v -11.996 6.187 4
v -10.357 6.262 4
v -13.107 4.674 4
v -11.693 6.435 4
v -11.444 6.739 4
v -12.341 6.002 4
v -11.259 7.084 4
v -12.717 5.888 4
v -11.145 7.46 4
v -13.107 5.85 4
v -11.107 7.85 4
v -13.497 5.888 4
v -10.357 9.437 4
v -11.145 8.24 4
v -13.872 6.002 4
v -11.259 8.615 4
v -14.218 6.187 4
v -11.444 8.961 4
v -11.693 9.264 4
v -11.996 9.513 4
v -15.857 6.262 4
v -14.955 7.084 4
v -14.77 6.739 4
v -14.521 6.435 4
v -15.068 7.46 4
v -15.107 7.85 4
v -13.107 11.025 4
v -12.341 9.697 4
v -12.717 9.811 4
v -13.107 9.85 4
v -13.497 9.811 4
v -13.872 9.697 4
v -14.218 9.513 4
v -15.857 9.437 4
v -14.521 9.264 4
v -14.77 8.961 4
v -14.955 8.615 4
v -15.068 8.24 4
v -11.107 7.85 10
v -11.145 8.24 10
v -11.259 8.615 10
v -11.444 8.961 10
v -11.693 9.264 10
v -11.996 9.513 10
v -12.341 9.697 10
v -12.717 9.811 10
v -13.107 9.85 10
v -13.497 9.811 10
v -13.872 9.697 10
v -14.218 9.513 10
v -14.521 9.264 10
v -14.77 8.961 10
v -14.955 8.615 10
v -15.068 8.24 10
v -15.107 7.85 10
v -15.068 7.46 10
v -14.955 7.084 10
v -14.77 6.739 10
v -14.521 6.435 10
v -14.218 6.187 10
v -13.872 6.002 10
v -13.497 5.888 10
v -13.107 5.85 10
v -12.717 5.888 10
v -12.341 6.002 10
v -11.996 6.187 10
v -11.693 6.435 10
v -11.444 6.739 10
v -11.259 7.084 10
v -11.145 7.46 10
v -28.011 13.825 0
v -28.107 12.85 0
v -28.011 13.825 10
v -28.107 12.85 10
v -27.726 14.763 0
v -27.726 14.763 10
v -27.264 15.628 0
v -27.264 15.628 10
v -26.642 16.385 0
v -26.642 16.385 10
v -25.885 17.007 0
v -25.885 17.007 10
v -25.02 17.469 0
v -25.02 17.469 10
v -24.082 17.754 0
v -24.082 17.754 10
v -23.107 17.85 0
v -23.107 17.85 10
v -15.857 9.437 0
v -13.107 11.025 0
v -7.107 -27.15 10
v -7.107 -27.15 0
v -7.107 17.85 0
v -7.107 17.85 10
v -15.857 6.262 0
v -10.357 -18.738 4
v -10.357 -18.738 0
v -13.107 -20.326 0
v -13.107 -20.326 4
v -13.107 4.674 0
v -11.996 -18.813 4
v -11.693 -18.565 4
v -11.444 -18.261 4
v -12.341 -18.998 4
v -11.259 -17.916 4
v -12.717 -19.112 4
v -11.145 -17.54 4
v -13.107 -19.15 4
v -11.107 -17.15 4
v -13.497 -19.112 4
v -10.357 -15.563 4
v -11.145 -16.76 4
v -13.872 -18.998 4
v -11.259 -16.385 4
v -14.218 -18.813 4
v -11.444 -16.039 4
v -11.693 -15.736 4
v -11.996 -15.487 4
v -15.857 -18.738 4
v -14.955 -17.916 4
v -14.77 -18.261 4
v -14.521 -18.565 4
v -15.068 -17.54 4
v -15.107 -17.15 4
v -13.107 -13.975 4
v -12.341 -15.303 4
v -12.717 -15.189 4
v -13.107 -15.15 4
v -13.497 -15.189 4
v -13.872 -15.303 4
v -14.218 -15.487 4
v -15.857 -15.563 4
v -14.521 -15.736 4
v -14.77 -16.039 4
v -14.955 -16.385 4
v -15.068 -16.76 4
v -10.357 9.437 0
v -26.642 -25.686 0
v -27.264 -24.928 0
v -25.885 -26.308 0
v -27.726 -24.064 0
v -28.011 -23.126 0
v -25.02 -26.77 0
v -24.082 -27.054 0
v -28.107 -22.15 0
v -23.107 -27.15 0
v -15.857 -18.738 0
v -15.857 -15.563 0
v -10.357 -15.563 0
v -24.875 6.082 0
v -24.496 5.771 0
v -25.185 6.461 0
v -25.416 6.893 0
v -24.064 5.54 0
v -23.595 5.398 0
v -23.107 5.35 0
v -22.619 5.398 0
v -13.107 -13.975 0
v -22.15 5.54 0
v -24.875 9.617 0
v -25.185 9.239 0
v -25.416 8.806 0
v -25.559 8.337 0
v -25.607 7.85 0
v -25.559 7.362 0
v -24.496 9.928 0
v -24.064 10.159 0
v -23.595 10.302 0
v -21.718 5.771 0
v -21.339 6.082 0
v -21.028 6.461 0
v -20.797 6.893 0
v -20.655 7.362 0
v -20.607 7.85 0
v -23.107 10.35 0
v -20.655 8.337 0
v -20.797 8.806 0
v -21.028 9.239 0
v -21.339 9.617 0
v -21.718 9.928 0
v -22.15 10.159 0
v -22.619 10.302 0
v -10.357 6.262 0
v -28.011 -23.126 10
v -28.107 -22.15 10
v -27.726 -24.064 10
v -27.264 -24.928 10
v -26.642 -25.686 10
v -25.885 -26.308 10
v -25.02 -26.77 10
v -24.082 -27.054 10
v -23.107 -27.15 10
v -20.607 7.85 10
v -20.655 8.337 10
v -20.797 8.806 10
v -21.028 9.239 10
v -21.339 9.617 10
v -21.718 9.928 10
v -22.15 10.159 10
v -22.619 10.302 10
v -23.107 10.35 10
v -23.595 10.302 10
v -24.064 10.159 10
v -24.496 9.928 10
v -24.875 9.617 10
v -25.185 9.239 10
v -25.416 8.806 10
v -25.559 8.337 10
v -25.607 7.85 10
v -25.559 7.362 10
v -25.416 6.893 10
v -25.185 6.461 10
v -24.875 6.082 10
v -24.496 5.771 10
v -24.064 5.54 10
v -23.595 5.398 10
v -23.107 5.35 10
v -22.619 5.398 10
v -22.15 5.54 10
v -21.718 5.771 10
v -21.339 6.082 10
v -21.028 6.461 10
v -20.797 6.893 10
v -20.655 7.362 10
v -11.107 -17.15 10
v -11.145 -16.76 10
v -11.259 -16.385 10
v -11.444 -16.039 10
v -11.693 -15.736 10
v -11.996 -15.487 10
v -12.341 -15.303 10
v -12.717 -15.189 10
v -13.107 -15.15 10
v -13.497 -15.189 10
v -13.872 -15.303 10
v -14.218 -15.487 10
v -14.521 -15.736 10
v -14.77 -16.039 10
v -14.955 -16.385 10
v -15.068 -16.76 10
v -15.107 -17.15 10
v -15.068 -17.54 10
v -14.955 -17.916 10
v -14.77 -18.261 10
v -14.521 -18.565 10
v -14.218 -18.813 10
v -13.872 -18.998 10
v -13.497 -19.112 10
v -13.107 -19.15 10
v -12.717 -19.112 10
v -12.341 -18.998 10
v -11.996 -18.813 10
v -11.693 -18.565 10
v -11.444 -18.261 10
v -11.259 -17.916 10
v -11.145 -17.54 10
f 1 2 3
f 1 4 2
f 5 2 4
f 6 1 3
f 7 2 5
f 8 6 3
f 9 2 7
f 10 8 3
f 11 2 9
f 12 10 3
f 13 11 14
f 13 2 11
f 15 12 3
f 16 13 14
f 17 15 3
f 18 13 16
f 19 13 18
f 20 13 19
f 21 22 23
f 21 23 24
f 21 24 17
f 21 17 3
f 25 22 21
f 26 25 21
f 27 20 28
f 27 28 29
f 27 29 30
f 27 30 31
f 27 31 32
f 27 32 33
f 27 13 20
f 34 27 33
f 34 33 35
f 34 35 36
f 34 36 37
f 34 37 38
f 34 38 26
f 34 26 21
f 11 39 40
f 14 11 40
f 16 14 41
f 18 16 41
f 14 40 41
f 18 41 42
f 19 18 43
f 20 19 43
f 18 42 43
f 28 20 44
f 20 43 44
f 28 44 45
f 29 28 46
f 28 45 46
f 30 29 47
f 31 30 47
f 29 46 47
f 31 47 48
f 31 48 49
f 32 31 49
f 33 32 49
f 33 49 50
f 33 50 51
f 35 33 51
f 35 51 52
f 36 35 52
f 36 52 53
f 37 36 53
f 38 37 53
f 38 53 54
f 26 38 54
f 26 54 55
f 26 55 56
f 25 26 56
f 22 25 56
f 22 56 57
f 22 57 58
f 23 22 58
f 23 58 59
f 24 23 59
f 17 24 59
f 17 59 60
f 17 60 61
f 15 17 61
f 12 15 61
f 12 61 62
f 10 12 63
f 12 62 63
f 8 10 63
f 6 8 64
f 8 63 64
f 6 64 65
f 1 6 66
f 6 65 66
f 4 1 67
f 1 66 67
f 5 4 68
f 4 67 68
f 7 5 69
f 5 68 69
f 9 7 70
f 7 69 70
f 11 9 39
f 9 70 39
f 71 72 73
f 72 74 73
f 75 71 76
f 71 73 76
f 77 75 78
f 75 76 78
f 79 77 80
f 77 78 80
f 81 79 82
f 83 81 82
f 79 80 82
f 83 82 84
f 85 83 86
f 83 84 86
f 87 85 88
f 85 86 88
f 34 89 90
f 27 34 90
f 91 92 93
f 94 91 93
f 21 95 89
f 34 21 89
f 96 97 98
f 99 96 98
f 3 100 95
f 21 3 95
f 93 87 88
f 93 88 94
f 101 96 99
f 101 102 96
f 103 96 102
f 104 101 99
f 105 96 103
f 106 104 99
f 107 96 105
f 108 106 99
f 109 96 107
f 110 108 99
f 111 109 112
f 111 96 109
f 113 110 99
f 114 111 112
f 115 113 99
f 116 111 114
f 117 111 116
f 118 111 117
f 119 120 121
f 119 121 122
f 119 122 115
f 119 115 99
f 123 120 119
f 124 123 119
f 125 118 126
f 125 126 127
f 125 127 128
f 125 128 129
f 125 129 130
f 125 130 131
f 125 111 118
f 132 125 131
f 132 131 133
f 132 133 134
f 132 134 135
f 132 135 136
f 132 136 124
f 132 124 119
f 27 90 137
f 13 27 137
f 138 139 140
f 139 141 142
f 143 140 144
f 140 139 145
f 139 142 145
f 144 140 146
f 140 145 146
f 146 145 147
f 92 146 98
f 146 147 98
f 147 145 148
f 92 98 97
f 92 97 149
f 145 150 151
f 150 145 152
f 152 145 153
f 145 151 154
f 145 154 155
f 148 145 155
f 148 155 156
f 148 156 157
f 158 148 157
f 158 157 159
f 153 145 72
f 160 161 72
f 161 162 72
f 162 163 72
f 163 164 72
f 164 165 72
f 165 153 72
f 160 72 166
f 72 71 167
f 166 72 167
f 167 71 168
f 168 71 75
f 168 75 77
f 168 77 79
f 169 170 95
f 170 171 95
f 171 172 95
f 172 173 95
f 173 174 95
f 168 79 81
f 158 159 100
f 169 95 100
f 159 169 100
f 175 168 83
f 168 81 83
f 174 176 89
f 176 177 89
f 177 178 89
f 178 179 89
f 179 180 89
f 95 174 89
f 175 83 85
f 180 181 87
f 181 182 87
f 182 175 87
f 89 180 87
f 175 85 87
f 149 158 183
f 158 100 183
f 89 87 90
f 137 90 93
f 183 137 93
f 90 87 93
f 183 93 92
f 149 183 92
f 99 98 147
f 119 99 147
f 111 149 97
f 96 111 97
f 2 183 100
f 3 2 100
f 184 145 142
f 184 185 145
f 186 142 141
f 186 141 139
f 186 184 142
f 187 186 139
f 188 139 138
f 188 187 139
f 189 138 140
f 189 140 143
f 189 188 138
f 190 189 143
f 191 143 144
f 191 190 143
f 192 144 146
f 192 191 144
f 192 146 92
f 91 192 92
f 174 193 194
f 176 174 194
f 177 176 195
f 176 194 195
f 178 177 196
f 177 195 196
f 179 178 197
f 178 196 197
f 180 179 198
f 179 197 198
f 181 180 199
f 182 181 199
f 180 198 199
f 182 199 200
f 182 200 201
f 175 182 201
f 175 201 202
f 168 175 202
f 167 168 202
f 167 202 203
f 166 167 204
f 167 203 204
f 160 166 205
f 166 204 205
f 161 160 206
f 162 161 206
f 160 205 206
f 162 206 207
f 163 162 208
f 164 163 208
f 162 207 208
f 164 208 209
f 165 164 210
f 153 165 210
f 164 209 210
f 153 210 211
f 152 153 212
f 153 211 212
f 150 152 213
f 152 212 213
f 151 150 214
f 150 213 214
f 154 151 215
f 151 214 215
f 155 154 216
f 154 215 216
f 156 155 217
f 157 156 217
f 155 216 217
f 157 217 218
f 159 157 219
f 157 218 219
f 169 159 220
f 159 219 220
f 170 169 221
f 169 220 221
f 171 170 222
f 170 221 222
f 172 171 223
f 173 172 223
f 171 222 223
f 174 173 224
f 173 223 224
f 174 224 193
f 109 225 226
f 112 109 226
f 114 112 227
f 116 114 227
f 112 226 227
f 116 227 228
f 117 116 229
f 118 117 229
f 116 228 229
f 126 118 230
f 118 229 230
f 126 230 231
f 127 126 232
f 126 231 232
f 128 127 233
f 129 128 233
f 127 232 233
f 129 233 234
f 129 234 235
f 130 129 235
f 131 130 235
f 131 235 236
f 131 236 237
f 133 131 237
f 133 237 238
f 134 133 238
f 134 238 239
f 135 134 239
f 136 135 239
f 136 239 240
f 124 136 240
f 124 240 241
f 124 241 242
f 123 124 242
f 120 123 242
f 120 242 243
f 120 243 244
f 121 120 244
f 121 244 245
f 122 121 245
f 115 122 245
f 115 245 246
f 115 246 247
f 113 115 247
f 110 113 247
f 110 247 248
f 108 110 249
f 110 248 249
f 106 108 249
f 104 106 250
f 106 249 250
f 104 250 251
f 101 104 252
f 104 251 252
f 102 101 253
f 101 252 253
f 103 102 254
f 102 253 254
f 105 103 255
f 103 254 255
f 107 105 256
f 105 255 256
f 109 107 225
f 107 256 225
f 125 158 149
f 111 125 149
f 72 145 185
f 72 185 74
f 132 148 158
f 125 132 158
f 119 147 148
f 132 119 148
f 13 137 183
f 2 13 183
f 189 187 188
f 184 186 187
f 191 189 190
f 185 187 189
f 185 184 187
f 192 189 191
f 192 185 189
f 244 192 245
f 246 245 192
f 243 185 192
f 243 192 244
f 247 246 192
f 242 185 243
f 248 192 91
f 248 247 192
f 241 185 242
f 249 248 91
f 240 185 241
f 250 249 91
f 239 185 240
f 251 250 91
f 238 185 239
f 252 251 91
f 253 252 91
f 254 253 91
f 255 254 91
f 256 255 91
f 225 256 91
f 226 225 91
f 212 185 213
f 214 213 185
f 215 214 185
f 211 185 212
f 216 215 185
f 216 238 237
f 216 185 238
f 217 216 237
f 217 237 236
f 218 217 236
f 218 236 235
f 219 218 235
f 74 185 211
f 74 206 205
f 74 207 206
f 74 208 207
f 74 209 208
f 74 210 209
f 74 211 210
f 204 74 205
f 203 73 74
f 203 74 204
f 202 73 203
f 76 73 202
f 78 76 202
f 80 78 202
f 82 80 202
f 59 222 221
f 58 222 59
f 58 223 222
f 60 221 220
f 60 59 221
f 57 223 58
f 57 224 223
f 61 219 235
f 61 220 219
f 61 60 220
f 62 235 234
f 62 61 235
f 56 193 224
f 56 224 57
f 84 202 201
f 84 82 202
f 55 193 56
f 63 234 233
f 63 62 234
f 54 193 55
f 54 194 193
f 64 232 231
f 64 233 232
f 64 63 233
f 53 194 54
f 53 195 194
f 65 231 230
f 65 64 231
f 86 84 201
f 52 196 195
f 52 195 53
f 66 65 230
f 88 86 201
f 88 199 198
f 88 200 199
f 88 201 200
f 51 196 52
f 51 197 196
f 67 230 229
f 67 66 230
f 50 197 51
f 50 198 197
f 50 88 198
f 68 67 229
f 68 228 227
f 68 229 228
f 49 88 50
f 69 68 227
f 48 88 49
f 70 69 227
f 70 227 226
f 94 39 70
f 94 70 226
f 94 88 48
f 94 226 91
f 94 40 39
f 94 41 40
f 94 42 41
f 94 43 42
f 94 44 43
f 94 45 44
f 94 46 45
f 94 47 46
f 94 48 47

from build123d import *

# Parameters (mm, degrees)
ESQUISSE1_W             = 21
ESQUISSE1_H             = 45
BOSS_EXTRU_1_DEPTH      = 10
ESQUISSE2_R             = 2.5
ENL_V_MAT_EXTRU_1_DEPTH = 10
ESQUISSE4_R             = 2
ENL_V_MAT_EXTRU_3_DEPTH = 10
CONG_1_R                = 5
ENL_V_MAT_EXTRU_6_DEPTH = 4


with BuildPart() as part:
    # Esquisse1 → Boss.-Extru.1 (new body)
    with BuildSketch(Plane.XY):
        with Locations((-17.606794518, -4.650313152)):
            Rectangle(ESQUISSE1_W, ESQUISSE1_H)
    extrude(amount=BOSS_EXTRU_1_DEPTH)

    # Esquisse2 → Enlèv. mat.-Extru.1 (cut)
    with BuildSketch(Plane.XY.offset(10)):
        with Locations((-23.106794518, 7.849686848)):
            Circle(ESQUISSE2_R)
    extrude(amount=-ENL_V_MAT_EXTRU_1_DEPTH, mode=Mode.SUBTRACT)

    # Esquisse4 → Enlèv. mat.-Extru.3 (cut)
    with BuildSketch(Plane.XY.offset(10)):
        with Locations((-13.106794518, 7.849686848)):
            Circle(ESQUISSE4_R)
        with Locations((-13.106794518, -17.150313152)):
            Circle(ESQUISSE4_R)
    extrude(amount=-ENL_V_MAT_EXTRU_3_DEPTH, mode=Mode.SUBTRACT)

    # Congé1
    cong_1_edges = [part.edges().sort_by_distance(p)[0] for p in [
        (-28.106794518, 17.849686848, 5),
        (-28.106794518, -27.150313152, 5),
    ]]
    fillet(cong_1_edges, radius=CONG_1_R)

    # Esquisse7 → Enlèv. mat.-Extru.6 (cut)
    with BuildSketch(Plane(origin=(0, 0, 0), x_dir=(-1, 0, 0), z_dir=(0, 0, -1))):
        Polygon((15.856794518, 9.437400088), (13.106794518, 11.025113328), (10.356794518, 9.437400088), (10.356794518, 6.261973607), (13.106794518, 4.674260367), (15.856794518, 6.261973607), align=None)
        Polygon((15.856794518, -15.562599912), (13.106794518, -13.974886672), (10.356794518, -15.562599912), (10.356794518, -18.738026393), (13.106794518, -20.325739633), (15.856794518, -18.738026393), align=None)
    extrude(amount=-ENL_V_MAT_EXTRU_6_DEPTH, mode=Mode.SUBTRACT)


solid = part.part
